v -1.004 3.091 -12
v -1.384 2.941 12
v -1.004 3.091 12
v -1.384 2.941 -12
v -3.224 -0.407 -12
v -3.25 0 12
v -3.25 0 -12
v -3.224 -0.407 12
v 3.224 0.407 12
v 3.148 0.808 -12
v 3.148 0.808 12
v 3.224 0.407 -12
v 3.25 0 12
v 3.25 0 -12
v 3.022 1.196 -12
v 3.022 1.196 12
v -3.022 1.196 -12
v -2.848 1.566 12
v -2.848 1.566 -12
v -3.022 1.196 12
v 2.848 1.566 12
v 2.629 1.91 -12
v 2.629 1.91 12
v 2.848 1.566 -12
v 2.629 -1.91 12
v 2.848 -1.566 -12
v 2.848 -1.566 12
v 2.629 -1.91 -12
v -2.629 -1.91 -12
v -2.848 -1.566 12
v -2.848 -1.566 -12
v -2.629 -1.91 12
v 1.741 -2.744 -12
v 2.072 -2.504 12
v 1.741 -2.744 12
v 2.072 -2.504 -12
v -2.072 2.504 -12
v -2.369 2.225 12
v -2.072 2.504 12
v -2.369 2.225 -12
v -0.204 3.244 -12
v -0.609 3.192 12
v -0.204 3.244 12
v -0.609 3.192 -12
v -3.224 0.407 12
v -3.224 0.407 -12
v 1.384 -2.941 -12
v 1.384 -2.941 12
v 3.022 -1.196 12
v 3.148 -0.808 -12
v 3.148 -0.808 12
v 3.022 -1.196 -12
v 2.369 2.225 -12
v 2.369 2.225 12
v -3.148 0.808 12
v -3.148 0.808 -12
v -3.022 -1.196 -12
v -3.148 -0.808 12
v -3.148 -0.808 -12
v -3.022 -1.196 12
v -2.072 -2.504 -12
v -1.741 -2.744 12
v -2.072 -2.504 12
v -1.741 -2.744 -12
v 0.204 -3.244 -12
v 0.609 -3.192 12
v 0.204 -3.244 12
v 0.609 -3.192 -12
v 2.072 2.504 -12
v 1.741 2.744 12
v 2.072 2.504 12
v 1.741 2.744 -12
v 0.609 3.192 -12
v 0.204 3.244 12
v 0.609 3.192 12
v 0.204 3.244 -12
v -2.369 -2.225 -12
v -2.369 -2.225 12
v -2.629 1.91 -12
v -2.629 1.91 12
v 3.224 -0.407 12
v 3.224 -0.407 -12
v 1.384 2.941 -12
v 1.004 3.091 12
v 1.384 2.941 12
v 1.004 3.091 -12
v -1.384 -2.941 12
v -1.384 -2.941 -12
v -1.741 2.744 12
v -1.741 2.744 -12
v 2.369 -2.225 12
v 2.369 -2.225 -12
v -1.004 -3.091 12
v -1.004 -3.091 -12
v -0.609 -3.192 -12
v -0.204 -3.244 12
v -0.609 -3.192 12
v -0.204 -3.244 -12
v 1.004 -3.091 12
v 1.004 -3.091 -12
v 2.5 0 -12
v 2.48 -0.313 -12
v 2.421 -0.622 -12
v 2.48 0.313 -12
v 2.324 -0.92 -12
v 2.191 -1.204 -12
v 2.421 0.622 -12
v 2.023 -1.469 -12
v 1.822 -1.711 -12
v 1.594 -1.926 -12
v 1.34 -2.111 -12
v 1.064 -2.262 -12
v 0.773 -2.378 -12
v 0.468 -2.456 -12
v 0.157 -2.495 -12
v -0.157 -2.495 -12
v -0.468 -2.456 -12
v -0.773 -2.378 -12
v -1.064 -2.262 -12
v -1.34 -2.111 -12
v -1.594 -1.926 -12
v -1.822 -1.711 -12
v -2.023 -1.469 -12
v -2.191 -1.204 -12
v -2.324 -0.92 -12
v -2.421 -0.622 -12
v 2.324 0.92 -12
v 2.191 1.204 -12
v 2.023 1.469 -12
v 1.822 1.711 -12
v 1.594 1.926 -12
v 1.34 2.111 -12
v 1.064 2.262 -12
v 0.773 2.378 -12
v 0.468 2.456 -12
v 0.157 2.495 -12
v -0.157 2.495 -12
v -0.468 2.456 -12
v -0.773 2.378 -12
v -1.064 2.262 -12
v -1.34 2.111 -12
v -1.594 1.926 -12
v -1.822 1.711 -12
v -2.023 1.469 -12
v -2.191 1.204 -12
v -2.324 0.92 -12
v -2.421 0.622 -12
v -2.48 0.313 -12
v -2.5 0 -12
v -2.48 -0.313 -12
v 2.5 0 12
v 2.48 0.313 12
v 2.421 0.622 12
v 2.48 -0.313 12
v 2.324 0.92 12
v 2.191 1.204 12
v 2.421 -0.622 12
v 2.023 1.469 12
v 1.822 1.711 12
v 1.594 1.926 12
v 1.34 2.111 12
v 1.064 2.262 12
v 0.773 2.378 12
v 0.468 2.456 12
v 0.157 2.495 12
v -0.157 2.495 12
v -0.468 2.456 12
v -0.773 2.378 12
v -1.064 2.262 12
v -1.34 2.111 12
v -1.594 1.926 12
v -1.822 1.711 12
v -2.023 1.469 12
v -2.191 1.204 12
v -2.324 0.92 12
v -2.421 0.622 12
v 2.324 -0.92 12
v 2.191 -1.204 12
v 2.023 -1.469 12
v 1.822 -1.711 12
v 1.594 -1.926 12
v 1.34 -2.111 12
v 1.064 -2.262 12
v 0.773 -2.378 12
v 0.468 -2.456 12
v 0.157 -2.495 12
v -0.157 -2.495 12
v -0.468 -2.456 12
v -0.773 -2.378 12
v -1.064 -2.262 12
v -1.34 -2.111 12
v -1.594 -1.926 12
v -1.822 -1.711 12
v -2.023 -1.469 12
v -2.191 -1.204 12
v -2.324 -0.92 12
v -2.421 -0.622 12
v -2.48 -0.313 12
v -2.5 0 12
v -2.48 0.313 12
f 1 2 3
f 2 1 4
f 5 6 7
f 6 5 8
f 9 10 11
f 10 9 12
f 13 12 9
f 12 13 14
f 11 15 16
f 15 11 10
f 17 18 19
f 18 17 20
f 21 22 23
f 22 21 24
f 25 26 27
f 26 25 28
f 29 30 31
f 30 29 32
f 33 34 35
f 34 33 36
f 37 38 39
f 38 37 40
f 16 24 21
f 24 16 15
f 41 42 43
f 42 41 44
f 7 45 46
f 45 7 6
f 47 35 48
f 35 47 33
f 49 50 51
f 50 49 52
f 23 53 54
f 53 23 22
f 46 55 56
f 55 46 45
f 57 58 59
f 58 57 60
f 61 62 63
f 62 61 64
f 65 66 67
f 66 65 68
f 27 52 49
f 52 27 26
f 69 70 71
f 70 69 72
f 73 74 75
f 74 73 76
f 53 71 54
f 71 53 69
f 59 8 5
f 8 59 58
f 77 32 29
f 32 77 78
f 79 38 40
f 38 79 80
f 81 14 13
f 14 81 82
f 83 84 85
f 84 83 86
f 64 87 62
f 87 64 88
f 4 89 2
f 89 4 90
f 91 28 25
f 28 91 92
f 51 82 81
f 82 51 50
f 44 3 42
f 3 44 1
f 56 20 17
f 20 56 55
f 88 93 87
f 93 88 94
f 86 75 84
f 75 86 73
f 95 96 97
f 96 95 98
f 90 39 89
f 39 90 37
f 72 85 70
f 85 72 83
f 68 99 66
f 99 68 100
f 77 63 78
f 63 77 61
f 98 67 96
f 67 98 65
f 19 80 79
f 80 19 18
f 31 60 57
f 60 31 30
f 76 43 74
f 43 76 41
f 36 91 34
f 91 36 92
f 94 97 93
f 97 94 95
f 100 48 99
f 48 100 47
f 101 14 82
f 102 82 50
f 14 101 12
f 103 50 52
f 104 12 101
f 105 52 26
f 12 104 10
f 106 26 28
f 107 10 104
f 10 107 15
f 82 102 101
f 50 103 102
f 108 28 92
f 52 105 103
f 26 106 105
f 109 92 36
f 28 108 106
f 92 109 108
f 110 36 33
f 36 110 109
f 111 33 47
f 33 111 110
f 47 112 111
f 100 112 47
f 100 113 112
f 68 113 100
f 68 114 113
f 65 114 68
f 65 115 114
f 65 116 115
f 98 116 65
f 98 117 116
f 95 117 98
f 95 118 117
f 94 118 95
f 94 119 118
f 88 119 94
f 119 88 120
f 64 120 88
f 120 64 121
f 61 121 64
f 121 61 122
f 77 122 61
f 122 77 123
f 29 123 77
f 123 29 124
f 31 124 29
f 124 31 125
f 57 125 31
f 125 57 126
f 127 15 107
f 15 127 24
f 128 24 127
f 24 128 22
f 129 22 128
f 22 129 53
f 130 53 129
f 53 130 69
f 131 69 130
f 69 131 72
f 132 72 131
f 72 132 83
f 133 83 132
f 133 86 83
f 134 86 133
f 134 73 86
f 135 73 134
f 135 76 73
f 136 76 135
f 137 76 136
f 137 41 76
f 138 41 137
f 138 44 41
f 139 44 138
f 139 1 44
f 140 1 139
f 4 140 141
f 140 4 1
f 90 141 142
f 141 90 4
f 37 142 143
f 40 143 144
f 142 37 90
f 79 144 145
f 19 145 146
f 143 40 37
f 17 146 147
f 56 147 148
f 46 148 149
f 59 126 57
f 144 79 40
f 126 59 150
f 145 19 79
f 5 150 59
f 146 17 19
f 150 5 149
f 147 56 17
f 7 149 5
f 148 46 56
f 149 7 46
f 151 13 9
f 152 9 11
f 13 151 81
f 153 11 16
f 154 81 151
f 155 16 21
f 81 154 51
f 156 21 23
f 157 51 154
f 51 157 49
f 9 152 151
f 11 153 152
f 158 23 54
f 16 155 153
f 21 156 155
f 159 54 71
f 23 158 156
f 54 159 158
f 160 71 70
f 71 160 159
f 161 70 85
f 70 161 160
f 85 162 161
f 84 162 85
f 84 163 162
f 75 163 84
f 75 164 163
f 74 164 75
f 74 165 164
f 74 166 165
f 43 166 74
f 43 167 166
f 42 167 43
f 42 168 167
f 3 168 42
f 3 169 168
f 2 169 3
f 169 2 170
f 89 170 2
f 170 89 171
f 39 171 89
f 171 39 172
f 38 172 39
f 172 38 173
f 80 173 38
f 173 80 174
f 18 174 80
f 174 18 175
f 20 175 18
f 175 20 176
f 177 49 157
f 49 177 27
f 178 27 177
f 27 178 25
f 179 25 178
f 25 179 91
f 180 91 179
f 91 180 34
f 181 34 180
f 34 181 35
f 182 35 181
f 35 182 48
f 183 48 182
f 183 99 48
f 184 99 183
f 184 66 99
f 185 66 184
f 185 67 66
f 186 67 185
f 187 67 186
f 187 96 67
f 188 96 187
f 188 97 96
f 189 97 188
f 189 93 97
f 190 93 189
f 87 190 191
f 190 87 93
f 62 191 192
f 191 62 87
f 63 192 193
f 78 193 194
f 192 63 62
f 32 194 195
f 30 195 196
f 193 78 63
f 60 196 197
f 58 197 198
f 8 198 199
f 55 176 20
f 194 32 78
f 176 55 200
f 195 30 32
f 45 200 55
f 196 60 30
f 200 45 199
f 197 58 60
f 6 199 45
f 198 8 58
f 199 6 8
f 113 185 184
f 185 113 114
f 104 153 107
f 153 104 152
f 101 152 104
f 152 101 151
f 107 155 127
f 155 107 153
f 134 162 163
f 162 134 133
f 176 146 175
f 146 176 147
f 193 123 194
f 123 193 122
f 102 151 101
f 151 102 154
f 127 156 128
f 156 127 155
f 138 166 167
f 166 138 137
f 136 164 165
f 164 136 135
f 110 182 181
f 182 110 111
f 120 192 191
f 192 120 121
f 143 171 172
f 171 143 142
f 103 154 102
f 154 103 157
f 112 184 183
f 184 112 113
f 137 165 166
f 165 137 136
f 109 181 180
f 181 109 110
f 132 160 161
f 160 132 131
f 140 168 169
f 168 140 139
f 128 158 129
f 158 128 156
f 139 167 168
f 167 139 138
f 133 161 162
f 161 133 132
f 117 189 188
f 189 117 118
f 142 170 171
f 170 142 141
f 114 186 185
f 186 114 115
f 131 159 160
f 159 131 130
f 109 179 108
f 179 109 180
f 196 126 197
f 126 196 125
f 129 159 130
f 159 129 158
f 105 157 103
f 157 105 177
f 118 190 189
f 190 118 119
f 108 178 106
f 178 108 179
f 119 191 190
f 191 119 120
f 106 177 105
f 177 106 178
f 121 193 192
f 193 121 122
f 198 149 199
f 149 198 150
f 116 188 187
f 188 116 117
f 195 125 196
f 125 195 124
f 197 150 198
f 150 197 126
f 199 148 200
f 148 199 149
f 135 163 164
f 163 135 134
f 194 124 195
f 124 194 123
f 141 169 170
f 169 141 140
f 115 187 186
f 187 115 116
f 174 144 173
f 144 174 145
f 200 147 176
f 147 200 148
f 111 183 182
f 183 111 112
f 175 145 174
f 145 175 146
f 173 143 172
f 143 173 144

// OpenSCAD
$fn = 50;


difference() {
	union() {
		translate(v = [0, 0, -12.0000000000]) {
			cylinder(h = 24, r = 3.2500000000);
		}
	}
	union() {
		translate(v = [0, 0, -100.0000000000]) {
			cylinder(h = 200, r = 2.5000000000);
		}
	}
}
